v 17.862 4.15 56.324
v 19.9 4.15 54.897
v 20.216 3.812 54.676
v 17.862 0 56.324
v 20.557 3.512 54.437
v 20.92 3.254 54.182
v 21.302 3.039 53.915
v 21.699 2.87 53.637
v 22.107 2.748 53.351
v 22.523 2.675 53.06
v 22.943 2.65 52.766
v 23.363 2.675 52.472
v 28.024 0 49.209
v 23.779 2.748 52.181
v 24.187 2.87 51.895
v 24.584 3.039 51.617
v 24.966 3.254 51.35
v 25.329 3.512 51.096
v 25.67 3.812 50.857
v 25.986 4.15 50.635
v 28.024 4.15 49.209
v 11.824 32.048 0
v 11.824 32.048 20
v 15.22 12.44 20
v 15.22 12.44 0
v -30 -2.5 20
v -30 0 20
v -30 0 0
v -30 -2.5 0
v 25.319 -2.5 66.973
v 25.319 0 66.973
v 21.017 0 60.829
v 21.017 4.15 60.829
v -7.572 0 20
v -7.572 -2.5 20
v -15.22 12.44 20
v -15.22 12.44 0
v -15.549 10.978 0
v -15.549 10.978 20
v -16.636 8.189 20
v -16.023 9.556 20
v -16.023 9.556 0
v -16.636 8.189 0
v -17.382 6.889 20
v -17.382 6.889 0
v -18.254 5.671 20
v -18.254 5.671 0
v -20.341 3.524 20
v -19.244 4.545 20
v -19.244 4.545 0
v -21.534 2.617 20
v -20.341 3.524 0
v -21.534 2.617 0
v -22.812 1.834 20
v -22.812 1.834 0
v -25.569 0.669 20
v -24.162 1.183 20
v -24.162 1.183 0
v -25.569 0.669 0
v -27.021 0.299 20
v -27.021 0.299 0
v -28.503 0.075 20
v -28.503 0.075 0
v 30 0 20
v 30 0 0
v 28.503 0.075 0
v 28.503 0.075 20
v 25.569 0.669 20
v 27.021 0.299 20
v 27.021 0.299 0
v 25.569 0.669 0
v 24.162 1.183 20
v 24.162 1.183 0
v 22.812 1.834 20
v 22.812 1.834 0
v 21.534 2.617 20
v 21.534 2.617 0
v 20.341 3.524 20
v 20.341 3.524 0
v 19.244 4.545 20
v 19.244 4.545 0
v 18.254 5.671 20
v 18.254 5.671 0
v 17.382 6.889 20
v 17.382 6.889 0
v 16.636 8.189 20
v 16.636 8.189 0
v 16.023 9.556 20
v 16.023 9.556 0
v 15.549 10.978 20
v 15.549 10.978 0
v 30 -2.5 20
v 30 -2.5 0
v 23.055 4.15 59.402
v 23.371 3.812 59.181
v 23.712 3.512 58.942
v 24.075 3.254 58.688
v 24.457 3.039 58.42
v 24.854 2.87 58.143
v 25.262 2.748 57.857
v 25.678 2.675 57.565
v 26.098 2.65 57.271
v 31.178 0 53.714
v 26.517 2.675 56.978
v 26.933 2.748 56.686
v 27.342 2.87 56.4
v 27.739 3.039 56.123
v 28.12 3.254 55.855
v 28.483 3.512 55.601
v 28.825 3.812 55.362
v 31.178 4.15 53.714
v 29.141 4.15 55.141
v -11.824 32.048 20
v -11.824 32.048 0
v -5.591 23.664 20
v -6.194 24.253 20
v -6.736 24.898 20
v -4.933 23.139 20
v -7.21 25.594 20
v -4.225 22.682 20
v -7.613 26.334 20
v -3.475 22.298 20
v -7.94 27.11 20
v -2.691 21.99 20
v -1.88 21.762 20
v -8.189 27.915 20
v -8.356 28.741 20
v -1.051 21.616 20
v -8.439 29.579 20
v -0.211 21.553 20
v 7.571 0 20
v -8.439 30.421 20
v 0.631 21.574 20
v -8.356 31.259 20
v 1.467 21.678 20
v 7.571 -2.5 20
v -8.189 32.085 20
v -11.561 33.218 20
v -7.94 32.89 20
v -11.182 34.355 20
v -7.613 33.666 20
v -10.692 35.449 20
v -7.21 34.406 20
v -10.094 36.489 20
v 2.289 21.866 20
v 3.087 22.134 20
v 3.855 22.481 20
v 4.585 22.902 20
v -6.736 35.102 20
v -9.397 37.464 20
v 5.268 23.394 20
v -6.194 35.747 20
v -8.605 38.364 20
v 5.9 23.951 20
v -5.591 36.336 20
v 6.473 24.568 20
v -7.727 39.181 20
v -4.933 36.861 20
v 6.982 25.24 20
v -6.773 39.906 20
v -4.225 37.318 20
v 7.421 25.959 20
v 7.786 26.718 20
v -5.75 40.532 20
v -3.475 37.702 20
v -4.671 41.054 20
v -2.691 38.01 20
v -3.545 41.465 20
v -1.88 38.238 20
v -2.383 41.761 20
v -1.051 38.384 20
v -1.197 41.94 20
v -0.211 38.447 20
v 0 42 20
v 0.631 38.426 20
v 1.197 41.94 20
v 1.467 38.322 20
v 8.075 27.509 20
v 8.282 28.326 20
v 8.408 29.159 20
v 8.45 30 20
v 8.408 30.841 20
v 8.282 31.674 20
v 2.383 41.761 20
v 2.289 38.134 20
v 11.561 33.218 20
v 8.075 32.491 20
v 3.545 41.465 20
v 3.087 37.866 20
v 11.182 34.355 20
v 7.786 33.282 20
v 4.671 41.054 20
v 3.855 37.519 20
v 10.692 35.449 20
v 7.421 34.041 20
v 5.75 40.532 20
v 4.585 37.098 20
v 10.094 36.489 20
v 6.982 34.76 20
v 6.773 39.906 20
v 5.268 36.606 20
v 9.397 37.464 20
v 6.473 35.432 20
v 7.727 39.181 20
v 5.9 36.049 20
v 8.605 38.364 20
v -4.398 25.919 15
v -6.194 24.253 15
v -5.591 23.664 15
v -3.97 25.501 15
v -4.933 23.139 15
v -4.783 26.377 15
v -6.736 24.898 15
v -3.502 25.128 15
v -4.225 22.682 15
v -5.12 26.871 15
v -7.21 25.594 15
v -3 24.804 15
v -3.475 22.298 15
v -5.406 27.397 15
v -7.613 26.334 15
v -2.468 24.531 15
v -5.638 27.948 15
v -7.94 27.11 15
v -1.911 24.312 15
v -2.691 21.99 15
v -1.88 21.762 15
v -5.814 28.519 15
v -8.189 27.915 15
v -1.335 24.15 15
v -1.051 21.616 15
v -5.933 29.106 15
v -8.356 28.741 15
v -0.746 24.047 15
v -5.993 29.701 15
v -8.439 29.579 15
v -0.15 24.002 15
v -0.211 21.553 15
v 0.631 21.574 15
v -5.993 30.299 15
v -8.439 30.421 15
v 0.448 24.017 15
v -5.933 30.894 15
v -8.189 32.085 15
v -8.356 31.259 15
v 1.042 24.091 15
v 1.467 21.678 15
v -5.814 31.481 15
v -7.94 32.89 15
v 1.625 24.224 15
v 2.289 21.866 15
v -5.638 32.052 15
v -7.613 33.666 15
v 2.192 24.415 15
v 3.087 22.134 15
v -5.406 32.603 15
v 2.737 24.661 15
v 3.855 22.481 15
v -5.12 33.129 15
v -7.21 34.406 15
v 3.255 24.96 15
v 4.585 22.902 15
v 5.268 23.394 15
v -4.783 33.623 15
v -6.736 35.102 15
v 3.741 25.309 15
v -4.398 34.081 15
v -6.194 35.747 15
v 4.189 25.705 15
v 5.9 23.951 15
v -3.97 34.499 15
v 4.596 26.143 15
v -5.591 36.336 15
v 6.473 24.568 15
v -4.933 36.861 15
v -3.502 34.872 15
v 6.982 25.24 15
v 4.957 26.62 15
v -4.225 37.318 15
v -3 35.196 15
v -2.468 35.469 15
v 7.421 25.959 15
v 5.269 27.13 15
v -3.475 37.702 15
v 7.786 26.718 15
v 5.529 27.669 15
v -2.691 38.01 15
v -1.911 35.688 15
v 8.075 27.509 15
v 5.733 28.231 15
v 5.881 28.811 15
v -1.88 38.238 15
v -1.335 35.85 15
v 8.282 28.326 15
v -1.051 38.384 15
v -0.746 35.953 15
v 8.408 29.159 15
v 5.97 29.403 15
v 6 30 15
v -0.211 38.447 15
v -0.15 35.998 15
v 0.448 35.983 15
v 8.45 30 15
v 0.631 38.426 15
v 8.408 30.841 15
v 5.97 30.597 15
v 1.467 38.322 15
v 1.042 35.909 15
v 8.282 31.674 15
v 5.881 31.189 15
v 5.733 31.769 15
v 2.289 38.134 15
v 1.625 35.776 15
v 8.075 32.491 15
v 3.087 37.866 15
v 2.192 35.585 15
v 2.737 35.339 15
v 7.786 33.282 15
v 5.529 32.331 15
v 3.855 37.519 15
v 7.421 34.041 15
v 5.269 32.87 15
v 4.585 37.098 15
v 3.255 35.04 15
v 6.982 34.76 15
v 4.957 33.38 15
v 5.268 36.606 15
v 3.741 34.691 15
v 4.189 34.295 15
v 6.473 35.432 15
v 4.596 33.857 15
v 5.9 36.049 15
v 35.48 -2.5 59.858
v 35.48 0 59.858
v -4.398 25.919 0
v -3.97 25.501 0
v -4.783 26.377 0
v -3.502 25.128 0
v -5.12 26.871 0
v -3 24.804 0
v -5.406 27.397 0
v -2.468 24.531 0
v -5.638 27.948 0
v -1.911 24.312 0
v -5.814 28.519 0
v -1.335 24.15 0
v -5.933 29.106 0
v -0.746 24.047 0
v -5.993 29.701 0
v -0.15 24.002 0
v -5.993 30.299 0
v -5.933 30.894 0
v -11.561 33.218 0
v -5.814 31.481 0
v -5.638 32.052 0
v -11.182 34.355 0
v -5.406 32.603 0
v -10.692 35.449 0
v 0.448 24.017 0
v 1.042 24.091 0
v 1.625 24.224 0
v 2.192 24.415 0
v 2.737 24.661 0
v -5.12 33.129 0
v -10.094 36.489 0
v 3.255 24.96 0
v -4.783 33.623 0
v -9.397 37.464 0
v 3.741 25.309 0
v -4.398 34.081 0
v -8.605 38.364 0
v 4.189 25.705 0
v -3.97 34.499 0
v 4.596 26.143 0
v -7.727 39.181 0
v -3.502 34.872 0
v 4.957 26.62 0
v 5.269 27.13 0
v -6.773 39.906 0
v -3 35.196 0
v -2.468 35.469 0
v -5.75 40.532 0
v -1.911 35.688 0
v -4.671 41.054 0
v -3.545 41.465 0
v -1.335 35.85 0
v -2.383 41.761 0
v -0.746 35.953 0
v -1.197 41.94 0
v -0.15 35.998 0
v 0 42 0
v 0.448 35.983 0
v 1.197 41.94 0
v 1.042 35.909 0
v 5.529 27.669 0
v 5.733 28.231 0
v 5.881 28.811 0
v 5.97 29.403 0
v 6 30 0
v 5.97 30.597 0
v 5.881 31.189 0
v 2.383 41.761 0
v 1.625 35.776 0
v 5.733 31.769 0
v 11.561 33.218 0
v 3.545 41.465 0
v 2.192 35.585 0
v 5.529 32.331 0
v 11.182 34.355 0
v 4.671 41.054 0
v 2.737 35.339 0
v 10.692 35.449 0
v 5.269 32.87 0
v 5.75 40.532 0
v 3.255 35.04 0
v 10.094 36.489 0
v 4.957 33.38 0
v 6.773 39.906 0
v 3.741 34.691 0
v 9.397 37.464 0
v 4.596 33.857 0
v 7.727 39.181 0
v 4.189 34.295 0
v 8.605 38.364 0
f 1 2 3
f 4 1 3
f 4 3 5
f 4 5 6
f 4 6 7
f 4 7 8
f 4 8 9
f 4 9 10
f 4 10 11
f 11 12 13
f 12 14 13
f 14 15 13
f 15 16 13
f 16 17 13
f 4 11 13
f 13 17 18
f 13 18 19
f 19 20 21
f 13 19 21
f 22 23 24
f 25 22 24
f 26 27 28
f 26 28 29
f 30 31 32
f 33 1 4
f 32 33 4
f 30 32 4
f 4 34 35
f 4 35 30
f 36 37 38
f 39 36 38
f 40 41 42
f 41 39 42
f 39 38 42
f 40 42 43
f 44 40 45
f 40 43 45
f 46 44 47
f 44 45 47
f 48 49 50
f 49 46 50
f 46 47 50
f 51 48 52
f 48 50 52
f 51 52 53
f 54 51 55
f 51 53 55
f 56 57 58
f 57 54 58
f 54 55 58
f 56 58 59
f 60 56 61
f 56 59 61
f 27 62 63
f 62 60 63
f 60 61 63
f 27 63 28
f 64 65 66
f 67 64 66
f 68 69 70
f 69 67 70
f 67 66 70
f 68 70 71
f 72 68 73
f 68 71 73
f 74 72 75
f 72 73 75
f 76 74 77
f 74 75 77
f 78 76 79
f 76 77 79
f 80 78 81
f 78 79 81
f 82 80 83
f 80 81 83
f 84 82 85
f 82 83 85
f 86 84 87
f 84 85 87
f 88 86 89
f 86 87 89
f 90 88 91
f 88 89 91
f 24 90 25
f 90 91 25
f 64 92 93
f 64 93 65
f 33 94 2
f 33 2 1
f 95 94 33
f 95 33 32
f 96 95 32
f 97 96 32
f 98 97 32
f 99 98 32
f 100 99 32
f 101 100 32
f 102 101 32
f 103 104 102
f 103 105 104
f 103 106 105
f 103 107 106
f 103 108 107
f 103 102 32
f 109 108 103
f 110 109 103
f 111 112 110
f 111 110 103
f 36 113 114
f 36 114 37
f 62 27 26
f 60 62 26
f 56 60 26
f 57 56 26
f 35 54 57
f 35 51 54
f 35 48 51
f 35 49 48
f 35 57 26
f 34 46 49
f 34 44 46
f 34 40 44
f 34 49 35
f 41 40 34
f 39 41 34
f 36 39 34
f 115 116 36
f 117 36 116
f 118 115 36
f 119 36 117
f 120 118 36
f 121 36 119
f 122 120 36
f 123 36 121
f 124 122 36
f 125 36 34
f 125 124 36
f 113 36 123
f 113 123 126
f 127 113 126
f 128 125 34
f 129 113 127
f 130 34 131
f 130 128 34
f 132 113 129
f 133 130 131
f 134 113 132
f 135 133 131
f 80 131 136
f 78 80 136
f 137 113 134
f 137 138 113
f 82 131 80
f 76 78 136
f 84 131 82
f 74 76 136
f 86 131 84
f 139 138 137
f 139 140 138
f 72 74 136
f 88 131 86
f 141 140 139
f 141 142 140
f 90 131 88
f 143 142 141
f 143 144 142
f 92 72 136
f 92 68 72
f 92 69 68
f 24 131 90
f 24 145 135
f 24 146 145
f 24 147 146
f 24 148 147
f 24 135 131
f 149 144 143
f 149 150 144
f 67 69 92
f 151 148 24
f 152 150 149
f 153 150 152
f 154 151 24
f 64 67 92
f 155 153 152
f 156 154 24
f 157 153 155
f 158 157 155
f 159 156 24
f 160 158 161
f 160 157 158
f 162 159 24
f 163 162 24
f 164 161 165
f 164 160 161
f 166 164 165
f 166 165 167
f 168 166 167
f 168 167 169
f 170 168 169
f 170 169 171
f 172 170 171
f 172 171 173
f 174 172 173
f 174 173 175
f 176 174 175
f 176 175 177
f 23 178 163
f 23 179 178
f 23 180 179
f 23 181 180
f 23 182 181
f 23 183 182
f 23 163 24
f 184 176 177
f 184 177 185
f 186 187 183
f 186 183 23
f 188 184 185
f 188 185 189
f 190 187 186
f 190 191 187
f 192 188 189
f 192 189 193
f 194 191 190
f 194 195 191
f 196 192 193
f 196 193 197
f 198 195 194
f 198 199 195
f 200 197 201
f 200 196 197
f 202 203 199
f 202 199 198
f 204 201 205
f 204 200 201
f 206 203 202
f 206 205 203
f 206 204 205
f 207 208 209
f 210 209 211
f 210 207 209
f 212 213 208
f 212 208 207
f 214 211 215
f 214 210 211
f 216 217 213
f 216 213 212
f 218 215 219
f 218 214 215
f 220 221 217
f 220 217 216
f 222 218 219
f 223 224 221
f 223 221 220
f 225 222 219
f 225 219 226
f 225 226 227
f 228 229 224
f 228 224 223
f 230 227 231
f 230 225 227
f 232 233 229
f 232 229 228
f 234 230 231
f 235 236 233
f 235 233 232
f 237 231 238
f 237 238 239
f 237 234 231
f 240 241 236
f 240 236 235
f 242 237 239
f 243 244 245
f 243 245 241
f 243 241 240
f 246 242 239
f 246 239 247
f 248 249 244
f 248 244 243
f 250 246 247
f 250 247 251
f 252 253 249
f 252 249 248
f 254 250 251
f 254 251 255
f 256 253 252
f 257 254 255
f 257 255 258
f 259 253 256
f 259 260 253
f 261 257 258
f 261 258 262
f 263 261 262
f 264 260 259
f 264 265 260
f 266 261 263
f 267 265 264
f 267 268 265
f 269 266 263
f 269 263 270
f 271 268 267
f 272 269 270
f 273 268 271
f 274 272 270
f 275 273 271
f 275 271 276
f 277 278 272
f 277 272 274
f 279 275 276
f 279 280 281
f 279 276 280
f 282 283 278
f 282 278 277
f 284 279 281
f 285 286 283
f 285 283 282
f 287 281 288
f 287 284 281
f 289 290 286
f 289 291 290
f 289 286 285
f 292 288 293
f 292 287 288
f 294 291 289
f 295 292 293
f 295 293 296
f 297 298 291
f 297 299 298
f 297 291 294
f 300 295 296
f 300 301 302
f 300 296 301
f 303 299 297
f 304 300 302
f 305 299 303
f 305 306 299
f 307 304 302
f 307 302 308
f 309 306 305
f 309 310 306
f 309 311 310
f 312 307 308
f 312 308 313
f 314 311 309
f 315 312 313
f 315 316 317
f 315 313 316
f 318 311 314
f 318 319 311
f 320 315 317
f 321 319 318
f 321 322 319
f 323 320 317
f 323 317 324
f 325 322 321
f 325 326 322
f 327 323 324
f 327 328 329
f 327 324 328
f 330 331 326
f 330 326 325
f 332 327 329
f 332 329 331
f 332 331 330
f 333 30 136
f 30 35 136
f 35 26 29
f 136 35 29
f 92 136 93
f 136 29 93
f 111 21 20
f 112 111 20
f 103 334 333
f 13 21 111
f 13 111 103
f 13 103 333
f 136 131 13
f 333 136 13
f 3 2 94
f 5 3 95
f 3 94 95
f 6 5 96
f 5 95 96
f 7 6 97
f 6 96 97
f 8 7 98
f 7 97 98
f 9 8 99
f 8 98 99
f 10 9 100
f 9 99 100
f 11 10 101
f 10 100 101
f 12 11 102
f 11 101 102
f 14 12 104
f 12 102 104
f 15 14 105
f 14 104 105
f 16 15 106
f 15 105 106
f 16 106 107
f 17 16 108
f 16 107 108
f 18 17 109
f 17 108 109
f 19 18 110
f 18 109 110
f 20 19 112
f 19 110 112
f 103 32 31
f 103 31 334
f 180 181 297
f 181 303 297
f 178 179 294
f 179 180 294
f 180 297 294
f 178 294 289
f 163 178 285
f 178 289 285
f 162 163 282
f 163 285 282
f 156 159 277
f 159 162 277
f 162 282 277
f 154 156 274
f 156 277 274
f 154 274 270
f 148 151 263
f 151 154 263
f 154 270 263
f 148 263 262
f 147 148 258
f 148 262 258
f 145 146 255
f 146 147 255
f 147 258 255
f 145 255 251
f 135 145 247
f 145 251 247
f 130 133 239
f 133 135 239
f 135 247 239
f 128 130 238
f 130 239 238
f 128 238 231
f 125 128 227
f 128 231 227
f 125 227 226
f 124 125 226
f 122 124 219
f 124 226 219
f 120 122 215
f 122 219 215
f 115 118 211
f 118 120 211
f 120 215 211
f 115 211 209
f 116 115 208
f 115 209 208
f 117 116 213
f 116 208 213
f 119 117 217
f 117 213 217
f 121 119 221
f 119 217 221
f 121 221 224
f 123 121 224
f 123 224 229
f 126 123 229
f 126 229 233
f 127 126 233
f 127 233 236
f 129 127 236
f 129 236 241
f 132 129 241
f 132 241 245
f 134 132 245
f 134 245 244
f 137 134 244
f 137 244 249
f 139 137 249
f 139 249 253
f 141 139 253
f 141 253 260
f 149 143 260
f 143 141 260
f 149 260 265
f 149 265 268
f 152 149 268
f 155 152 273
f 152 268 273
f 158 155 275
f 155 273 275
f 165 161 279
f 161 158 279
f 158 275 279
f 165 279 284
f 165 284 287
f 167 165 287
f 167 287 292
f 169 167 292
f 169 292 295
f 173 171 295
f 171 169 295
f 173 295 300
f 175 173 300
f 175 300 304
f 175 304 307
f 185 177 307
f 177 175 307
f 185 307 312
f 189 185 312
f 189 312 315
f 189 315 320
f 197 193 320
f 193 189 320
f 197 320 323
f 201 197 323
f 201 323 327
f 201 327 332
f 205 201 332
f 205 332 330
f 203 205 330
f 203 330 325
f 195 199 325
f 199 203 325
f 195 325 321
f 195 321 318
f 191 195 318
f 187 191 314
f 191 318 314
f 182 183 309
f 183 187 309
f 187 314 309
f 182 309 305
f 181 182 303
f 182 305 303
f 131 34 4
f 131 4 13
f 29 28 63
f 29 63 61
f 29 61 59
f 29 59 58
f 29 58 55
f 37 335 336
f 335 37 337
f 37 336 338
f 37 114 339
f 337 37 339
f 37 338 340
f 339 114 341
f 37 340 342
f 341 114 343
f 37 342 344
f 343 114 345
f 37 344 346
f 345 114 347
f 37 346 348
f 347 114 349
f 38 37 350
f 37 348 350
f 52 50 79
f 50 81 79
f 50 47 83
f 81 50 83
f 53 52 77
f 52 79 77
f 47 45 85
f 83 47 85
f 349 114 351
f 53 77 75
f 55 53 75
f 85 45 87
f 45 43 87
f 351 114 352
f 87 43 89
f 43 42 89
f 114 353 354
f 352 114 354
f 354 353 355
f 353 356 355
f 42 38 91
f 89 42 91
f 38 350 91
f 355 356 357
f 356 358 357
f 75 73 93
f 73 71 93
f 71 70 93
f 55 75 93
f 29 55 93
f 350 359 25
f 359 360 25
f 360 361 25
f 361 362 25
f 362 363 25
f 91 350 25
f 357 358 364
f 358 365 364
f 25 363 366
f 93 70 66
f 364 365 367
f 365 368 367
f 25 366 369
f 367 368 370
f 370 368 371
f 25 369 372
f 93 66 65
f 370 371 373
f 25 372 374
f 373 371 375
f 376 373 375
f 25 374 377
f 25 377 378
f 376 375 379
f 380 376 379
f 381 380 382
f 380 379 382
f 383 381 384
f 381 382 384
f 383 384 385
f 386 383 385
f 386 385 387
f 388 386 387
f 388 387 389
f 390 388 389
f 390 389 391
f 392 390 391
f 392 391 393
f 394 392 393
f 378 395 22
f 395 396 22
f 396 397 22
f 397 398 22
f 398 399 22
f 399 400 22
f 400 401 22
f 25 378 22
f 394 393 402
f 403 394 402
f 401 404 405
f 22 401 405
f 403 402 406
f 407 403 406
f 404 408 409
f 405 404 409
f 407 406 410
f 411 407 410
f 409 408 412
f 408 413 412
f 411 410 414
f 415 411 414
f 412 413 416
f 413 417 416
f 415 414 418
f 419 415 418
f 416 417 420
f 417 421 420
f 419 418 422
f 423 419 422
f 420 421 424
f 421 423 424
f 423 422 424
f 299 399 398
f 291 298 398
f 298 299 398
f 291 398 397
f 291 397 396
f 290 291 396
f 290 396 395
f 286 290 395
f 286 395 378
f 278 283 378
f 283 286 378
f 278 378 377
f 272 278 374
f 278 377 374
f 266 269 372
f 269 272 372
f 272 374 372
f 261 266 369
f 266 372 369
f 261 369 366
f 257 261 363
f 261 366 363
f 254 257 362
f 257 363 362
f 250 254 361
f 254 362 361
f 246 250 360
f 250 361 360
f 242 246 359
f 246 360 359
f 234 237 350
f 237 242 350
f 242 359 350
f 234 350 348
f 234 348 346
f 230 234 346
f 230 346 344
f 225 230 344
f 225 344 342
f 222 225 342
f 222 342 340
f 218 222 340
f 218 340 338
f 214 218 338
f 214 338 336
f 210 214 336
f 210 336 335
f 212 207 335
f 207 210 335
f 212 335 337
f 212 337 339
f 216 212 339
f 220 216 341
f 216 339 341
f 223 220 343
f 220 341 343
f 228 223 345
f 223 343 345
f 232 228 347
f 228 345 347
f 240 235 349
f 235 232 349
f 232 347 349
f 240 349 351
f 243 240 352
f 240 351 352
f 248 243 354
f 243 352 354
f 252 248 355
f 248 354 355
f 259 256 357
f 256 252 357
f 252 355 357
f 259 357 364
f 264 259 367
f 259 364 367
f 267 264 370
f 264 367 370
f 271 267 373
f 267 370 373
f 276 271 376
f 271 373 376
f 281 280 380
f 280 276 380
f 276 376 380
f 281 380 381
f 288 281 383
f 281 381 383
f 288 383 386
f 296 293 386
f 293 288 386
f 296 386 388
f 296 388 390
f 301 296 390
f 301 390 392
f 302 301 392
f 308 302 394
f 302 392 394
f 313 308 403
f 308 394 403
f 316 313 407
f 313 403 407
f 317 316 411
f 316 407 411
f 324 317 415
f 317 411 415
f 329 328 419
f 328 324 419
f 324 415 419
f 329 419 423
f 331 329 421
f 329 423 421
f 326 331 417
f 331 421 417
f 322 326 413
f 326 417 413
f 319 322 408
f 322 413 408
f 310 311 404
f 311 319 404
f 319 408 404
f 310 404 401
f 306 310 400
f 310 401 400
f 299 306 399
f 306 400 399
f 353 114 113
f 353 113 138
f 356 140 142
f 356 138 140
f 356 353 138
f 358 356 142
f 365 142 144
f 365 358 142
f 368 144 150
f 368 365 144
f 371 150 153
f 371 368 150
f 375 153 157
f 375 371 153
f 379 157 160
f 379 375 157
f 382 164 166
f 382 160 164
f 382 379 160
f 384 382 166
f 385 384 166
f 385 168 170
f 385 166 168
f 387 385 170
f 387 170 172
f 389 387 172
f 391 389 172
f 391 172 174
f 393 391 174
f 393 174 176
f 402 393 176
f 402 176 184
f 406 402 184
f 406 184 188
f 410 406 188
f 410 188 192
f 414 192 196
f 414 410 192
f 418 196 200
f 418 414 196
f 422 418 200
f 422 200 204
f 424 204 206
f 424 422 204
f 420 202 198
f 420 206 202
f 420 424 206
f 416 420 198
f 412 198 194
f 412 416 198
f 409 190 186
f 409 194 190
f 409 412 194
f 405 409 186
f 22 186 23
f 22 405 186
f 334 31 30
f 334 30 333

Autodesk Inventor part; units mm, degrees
ref_plane "YZ Plane" through (0, 0, 0) normal (1, 0, 0) x (0, 1, 0)
ref_plane "XZ Plane" through (0, 0, 0) normal (0, 1, 0) x (-1, 0, 0)
ref_plane "XY Plane" through (0, 0, 0) normal (0, 0, 1) x (1, 0, 0)
sketch "Sketch1" plane through (0, 0, 0) normal (0, 0, 1) x (1, 0, 0)
  circle A0 centre (0, 30) radius 8.45
  circle A1 centre (0, 30) radius 6
  arc A2 (-30, 0) -> (-15.2201, 12.4401) centre (-30, 15) ccw
  arc A3 (15.2201, 12.4401) -> (30, 0) centre (30, 15) ccw
  arc A4 (11.824, 32.0479) -> (-11.824, 32.0479) centre (0, 30) ccw
  line L0 (-11.824, 32.0479) -> (-15.2201, 12.4401)
  line L1 (11.824, 32.0479) -> (15.2201, 12.4401)
  line L2 (30, 0) -> (-30, 0)
  line L3 (-30, 0) -> (-30, -2.5)
  line L4 (-30, -2.5) -> (30, -2.5)
  line L5 (30, -2.5) -> (30, 0)
  point P0 (0, 0)
  point P1 (0, 0)
  point P2 (0, 0)
  dimension "d0" = 16.9
  dimension "d1" = 12
  dimension "d2" = 30
  dimension "d3" = 12
  dimension "d4" = 15
  dimension "d5" = 60
  dimension "d6" = 2.5
extrude "Extrusion1" add sketch "Sketch1" along normal blind 20 contours A2 L0 A4 L1 A3 L2
extrude "Extrusion2" add sketch "Sketch1" along normal blind 15 contours A0
extrude "Extrusion3" add sketch "Sketch1" along normal blind 20 contours L2 L5 L4 L3
ref_plane "Work Plane1" through (-30, -2.5, 0) normal (0, -1, 0) x (1, 0, 0)
sketch "Sketch2" plane through (-30, -2.5, 0) normal (0, -1, 0) x (1, 0, 0)
  line L0 (21.55, 20) -> (38.45, 20) projected
  line L1 (30, 20) -> (30, 60) construction
  line L2 (60, 0) -> (60, 20) construction
  line L3 (30, 20) -> (52.9431, 52.7661) construction
  line L4 (47.9062, 63.0072) -> (64.2892, 51.5357)
  line L5 (64.2892, 51.5357) -> (61.1346, 47.0303)
  line L6 (61.1346, 47.0303) -> (44.7515, 58.5018) construction
  line L7 (44.7515, 58.5018) -> (47.9062, 63.0072)
  line L8 (44.7515, 58.5018) -> (17.7923, 20)
  line L9 (41.824, 20) -> (18.176, 20) projected
  line L10 (61.1346, 47.0303) -> (42.2077, 20)
  line L11 (0, 20) -> (60, 20) projected
  point P0 (30, 0)
  dimension "d14" = 35
  dimension "d16" = 5.5
  dimension "d17" = 20
  dimension "d26" = 40
extrude "Extrusion6" add sketch "Sketch2" against normal blind 2.5
sketch "Sketch4" plane through (34.2892, -2.5, 51.5357) normal (0.5735764, 0, 0.819152) x (0.819152, 0, -0.5735764)
  line L0 (-23.103, 0) -> (-34.5746, 0) projected
  circle A0 centre (-10, 10.5) radius 7.3 construction
  circle A1 centre (-10, 10.5) radius 5.35
  line L1 (-16.2022, 2.5) -> (-3.7978, 2.5)
  line L2 (-3.7978, 2.5) -> (-3.7978, 6.65)
  line L3 (-3.7978, 6.65) -> (-16.2022, 6.65)
  line L4 (-16.2022, 6.65) -> (-16.2022, 2.5)
  line L5 (-20, 2.5) -> (0, 2.5) projected
  line L6 (-16.2022, 2.5) -> (-16.2022, 0)
  line L7 (-3.7978, 2.5) -> (-3.7978, 0)
  line L8 (-23.103, 0) -> (26.0461, 0) projected
  line L9 (0, 0) -> (-20, 0) projected
  line L10 (0, 0) -> (0, 2.5) projected
  line L11 (-20, 2.5) -> (0, 2.5) projected
  line L12 (-20, 0) -> (-20, 2.5) projected
  point P0 (1.4715, 2.5)
  point P1 (-10, 2.5)
  point P2 (-6.2852, 6.65)
  point P3 (-13.7148, 6.65)
  point P4 (0, 0)
  point P5 (0, 2.5)
  point P6 (-20, 2.5)
  point P7 (-20, 0)
  point P8 (-16.2022, 2.5)
  dimension "d29" = 14.6
  dimension "d30" = 10.7
  dimension "d31" = 1.5
  dimension "d32" = 8
extrude "Extrusion7" add sketch "Sketch4" against normal blind 5.5 contours A1 L3 L2 L1 L4
extrude "Extrusion8" cut sketch "Sketch4" against normal up to surface contours L6 L8 L12 L5 | L5 L10 L8 L7 surface through (0, 21, 20) normal (0, 0, 1)
extrude "Extrusion9" add sketch "Sketch4" along normal blind 7.5 contours L1 L7 L8 L6
properties part number "Support 1 - V2"
